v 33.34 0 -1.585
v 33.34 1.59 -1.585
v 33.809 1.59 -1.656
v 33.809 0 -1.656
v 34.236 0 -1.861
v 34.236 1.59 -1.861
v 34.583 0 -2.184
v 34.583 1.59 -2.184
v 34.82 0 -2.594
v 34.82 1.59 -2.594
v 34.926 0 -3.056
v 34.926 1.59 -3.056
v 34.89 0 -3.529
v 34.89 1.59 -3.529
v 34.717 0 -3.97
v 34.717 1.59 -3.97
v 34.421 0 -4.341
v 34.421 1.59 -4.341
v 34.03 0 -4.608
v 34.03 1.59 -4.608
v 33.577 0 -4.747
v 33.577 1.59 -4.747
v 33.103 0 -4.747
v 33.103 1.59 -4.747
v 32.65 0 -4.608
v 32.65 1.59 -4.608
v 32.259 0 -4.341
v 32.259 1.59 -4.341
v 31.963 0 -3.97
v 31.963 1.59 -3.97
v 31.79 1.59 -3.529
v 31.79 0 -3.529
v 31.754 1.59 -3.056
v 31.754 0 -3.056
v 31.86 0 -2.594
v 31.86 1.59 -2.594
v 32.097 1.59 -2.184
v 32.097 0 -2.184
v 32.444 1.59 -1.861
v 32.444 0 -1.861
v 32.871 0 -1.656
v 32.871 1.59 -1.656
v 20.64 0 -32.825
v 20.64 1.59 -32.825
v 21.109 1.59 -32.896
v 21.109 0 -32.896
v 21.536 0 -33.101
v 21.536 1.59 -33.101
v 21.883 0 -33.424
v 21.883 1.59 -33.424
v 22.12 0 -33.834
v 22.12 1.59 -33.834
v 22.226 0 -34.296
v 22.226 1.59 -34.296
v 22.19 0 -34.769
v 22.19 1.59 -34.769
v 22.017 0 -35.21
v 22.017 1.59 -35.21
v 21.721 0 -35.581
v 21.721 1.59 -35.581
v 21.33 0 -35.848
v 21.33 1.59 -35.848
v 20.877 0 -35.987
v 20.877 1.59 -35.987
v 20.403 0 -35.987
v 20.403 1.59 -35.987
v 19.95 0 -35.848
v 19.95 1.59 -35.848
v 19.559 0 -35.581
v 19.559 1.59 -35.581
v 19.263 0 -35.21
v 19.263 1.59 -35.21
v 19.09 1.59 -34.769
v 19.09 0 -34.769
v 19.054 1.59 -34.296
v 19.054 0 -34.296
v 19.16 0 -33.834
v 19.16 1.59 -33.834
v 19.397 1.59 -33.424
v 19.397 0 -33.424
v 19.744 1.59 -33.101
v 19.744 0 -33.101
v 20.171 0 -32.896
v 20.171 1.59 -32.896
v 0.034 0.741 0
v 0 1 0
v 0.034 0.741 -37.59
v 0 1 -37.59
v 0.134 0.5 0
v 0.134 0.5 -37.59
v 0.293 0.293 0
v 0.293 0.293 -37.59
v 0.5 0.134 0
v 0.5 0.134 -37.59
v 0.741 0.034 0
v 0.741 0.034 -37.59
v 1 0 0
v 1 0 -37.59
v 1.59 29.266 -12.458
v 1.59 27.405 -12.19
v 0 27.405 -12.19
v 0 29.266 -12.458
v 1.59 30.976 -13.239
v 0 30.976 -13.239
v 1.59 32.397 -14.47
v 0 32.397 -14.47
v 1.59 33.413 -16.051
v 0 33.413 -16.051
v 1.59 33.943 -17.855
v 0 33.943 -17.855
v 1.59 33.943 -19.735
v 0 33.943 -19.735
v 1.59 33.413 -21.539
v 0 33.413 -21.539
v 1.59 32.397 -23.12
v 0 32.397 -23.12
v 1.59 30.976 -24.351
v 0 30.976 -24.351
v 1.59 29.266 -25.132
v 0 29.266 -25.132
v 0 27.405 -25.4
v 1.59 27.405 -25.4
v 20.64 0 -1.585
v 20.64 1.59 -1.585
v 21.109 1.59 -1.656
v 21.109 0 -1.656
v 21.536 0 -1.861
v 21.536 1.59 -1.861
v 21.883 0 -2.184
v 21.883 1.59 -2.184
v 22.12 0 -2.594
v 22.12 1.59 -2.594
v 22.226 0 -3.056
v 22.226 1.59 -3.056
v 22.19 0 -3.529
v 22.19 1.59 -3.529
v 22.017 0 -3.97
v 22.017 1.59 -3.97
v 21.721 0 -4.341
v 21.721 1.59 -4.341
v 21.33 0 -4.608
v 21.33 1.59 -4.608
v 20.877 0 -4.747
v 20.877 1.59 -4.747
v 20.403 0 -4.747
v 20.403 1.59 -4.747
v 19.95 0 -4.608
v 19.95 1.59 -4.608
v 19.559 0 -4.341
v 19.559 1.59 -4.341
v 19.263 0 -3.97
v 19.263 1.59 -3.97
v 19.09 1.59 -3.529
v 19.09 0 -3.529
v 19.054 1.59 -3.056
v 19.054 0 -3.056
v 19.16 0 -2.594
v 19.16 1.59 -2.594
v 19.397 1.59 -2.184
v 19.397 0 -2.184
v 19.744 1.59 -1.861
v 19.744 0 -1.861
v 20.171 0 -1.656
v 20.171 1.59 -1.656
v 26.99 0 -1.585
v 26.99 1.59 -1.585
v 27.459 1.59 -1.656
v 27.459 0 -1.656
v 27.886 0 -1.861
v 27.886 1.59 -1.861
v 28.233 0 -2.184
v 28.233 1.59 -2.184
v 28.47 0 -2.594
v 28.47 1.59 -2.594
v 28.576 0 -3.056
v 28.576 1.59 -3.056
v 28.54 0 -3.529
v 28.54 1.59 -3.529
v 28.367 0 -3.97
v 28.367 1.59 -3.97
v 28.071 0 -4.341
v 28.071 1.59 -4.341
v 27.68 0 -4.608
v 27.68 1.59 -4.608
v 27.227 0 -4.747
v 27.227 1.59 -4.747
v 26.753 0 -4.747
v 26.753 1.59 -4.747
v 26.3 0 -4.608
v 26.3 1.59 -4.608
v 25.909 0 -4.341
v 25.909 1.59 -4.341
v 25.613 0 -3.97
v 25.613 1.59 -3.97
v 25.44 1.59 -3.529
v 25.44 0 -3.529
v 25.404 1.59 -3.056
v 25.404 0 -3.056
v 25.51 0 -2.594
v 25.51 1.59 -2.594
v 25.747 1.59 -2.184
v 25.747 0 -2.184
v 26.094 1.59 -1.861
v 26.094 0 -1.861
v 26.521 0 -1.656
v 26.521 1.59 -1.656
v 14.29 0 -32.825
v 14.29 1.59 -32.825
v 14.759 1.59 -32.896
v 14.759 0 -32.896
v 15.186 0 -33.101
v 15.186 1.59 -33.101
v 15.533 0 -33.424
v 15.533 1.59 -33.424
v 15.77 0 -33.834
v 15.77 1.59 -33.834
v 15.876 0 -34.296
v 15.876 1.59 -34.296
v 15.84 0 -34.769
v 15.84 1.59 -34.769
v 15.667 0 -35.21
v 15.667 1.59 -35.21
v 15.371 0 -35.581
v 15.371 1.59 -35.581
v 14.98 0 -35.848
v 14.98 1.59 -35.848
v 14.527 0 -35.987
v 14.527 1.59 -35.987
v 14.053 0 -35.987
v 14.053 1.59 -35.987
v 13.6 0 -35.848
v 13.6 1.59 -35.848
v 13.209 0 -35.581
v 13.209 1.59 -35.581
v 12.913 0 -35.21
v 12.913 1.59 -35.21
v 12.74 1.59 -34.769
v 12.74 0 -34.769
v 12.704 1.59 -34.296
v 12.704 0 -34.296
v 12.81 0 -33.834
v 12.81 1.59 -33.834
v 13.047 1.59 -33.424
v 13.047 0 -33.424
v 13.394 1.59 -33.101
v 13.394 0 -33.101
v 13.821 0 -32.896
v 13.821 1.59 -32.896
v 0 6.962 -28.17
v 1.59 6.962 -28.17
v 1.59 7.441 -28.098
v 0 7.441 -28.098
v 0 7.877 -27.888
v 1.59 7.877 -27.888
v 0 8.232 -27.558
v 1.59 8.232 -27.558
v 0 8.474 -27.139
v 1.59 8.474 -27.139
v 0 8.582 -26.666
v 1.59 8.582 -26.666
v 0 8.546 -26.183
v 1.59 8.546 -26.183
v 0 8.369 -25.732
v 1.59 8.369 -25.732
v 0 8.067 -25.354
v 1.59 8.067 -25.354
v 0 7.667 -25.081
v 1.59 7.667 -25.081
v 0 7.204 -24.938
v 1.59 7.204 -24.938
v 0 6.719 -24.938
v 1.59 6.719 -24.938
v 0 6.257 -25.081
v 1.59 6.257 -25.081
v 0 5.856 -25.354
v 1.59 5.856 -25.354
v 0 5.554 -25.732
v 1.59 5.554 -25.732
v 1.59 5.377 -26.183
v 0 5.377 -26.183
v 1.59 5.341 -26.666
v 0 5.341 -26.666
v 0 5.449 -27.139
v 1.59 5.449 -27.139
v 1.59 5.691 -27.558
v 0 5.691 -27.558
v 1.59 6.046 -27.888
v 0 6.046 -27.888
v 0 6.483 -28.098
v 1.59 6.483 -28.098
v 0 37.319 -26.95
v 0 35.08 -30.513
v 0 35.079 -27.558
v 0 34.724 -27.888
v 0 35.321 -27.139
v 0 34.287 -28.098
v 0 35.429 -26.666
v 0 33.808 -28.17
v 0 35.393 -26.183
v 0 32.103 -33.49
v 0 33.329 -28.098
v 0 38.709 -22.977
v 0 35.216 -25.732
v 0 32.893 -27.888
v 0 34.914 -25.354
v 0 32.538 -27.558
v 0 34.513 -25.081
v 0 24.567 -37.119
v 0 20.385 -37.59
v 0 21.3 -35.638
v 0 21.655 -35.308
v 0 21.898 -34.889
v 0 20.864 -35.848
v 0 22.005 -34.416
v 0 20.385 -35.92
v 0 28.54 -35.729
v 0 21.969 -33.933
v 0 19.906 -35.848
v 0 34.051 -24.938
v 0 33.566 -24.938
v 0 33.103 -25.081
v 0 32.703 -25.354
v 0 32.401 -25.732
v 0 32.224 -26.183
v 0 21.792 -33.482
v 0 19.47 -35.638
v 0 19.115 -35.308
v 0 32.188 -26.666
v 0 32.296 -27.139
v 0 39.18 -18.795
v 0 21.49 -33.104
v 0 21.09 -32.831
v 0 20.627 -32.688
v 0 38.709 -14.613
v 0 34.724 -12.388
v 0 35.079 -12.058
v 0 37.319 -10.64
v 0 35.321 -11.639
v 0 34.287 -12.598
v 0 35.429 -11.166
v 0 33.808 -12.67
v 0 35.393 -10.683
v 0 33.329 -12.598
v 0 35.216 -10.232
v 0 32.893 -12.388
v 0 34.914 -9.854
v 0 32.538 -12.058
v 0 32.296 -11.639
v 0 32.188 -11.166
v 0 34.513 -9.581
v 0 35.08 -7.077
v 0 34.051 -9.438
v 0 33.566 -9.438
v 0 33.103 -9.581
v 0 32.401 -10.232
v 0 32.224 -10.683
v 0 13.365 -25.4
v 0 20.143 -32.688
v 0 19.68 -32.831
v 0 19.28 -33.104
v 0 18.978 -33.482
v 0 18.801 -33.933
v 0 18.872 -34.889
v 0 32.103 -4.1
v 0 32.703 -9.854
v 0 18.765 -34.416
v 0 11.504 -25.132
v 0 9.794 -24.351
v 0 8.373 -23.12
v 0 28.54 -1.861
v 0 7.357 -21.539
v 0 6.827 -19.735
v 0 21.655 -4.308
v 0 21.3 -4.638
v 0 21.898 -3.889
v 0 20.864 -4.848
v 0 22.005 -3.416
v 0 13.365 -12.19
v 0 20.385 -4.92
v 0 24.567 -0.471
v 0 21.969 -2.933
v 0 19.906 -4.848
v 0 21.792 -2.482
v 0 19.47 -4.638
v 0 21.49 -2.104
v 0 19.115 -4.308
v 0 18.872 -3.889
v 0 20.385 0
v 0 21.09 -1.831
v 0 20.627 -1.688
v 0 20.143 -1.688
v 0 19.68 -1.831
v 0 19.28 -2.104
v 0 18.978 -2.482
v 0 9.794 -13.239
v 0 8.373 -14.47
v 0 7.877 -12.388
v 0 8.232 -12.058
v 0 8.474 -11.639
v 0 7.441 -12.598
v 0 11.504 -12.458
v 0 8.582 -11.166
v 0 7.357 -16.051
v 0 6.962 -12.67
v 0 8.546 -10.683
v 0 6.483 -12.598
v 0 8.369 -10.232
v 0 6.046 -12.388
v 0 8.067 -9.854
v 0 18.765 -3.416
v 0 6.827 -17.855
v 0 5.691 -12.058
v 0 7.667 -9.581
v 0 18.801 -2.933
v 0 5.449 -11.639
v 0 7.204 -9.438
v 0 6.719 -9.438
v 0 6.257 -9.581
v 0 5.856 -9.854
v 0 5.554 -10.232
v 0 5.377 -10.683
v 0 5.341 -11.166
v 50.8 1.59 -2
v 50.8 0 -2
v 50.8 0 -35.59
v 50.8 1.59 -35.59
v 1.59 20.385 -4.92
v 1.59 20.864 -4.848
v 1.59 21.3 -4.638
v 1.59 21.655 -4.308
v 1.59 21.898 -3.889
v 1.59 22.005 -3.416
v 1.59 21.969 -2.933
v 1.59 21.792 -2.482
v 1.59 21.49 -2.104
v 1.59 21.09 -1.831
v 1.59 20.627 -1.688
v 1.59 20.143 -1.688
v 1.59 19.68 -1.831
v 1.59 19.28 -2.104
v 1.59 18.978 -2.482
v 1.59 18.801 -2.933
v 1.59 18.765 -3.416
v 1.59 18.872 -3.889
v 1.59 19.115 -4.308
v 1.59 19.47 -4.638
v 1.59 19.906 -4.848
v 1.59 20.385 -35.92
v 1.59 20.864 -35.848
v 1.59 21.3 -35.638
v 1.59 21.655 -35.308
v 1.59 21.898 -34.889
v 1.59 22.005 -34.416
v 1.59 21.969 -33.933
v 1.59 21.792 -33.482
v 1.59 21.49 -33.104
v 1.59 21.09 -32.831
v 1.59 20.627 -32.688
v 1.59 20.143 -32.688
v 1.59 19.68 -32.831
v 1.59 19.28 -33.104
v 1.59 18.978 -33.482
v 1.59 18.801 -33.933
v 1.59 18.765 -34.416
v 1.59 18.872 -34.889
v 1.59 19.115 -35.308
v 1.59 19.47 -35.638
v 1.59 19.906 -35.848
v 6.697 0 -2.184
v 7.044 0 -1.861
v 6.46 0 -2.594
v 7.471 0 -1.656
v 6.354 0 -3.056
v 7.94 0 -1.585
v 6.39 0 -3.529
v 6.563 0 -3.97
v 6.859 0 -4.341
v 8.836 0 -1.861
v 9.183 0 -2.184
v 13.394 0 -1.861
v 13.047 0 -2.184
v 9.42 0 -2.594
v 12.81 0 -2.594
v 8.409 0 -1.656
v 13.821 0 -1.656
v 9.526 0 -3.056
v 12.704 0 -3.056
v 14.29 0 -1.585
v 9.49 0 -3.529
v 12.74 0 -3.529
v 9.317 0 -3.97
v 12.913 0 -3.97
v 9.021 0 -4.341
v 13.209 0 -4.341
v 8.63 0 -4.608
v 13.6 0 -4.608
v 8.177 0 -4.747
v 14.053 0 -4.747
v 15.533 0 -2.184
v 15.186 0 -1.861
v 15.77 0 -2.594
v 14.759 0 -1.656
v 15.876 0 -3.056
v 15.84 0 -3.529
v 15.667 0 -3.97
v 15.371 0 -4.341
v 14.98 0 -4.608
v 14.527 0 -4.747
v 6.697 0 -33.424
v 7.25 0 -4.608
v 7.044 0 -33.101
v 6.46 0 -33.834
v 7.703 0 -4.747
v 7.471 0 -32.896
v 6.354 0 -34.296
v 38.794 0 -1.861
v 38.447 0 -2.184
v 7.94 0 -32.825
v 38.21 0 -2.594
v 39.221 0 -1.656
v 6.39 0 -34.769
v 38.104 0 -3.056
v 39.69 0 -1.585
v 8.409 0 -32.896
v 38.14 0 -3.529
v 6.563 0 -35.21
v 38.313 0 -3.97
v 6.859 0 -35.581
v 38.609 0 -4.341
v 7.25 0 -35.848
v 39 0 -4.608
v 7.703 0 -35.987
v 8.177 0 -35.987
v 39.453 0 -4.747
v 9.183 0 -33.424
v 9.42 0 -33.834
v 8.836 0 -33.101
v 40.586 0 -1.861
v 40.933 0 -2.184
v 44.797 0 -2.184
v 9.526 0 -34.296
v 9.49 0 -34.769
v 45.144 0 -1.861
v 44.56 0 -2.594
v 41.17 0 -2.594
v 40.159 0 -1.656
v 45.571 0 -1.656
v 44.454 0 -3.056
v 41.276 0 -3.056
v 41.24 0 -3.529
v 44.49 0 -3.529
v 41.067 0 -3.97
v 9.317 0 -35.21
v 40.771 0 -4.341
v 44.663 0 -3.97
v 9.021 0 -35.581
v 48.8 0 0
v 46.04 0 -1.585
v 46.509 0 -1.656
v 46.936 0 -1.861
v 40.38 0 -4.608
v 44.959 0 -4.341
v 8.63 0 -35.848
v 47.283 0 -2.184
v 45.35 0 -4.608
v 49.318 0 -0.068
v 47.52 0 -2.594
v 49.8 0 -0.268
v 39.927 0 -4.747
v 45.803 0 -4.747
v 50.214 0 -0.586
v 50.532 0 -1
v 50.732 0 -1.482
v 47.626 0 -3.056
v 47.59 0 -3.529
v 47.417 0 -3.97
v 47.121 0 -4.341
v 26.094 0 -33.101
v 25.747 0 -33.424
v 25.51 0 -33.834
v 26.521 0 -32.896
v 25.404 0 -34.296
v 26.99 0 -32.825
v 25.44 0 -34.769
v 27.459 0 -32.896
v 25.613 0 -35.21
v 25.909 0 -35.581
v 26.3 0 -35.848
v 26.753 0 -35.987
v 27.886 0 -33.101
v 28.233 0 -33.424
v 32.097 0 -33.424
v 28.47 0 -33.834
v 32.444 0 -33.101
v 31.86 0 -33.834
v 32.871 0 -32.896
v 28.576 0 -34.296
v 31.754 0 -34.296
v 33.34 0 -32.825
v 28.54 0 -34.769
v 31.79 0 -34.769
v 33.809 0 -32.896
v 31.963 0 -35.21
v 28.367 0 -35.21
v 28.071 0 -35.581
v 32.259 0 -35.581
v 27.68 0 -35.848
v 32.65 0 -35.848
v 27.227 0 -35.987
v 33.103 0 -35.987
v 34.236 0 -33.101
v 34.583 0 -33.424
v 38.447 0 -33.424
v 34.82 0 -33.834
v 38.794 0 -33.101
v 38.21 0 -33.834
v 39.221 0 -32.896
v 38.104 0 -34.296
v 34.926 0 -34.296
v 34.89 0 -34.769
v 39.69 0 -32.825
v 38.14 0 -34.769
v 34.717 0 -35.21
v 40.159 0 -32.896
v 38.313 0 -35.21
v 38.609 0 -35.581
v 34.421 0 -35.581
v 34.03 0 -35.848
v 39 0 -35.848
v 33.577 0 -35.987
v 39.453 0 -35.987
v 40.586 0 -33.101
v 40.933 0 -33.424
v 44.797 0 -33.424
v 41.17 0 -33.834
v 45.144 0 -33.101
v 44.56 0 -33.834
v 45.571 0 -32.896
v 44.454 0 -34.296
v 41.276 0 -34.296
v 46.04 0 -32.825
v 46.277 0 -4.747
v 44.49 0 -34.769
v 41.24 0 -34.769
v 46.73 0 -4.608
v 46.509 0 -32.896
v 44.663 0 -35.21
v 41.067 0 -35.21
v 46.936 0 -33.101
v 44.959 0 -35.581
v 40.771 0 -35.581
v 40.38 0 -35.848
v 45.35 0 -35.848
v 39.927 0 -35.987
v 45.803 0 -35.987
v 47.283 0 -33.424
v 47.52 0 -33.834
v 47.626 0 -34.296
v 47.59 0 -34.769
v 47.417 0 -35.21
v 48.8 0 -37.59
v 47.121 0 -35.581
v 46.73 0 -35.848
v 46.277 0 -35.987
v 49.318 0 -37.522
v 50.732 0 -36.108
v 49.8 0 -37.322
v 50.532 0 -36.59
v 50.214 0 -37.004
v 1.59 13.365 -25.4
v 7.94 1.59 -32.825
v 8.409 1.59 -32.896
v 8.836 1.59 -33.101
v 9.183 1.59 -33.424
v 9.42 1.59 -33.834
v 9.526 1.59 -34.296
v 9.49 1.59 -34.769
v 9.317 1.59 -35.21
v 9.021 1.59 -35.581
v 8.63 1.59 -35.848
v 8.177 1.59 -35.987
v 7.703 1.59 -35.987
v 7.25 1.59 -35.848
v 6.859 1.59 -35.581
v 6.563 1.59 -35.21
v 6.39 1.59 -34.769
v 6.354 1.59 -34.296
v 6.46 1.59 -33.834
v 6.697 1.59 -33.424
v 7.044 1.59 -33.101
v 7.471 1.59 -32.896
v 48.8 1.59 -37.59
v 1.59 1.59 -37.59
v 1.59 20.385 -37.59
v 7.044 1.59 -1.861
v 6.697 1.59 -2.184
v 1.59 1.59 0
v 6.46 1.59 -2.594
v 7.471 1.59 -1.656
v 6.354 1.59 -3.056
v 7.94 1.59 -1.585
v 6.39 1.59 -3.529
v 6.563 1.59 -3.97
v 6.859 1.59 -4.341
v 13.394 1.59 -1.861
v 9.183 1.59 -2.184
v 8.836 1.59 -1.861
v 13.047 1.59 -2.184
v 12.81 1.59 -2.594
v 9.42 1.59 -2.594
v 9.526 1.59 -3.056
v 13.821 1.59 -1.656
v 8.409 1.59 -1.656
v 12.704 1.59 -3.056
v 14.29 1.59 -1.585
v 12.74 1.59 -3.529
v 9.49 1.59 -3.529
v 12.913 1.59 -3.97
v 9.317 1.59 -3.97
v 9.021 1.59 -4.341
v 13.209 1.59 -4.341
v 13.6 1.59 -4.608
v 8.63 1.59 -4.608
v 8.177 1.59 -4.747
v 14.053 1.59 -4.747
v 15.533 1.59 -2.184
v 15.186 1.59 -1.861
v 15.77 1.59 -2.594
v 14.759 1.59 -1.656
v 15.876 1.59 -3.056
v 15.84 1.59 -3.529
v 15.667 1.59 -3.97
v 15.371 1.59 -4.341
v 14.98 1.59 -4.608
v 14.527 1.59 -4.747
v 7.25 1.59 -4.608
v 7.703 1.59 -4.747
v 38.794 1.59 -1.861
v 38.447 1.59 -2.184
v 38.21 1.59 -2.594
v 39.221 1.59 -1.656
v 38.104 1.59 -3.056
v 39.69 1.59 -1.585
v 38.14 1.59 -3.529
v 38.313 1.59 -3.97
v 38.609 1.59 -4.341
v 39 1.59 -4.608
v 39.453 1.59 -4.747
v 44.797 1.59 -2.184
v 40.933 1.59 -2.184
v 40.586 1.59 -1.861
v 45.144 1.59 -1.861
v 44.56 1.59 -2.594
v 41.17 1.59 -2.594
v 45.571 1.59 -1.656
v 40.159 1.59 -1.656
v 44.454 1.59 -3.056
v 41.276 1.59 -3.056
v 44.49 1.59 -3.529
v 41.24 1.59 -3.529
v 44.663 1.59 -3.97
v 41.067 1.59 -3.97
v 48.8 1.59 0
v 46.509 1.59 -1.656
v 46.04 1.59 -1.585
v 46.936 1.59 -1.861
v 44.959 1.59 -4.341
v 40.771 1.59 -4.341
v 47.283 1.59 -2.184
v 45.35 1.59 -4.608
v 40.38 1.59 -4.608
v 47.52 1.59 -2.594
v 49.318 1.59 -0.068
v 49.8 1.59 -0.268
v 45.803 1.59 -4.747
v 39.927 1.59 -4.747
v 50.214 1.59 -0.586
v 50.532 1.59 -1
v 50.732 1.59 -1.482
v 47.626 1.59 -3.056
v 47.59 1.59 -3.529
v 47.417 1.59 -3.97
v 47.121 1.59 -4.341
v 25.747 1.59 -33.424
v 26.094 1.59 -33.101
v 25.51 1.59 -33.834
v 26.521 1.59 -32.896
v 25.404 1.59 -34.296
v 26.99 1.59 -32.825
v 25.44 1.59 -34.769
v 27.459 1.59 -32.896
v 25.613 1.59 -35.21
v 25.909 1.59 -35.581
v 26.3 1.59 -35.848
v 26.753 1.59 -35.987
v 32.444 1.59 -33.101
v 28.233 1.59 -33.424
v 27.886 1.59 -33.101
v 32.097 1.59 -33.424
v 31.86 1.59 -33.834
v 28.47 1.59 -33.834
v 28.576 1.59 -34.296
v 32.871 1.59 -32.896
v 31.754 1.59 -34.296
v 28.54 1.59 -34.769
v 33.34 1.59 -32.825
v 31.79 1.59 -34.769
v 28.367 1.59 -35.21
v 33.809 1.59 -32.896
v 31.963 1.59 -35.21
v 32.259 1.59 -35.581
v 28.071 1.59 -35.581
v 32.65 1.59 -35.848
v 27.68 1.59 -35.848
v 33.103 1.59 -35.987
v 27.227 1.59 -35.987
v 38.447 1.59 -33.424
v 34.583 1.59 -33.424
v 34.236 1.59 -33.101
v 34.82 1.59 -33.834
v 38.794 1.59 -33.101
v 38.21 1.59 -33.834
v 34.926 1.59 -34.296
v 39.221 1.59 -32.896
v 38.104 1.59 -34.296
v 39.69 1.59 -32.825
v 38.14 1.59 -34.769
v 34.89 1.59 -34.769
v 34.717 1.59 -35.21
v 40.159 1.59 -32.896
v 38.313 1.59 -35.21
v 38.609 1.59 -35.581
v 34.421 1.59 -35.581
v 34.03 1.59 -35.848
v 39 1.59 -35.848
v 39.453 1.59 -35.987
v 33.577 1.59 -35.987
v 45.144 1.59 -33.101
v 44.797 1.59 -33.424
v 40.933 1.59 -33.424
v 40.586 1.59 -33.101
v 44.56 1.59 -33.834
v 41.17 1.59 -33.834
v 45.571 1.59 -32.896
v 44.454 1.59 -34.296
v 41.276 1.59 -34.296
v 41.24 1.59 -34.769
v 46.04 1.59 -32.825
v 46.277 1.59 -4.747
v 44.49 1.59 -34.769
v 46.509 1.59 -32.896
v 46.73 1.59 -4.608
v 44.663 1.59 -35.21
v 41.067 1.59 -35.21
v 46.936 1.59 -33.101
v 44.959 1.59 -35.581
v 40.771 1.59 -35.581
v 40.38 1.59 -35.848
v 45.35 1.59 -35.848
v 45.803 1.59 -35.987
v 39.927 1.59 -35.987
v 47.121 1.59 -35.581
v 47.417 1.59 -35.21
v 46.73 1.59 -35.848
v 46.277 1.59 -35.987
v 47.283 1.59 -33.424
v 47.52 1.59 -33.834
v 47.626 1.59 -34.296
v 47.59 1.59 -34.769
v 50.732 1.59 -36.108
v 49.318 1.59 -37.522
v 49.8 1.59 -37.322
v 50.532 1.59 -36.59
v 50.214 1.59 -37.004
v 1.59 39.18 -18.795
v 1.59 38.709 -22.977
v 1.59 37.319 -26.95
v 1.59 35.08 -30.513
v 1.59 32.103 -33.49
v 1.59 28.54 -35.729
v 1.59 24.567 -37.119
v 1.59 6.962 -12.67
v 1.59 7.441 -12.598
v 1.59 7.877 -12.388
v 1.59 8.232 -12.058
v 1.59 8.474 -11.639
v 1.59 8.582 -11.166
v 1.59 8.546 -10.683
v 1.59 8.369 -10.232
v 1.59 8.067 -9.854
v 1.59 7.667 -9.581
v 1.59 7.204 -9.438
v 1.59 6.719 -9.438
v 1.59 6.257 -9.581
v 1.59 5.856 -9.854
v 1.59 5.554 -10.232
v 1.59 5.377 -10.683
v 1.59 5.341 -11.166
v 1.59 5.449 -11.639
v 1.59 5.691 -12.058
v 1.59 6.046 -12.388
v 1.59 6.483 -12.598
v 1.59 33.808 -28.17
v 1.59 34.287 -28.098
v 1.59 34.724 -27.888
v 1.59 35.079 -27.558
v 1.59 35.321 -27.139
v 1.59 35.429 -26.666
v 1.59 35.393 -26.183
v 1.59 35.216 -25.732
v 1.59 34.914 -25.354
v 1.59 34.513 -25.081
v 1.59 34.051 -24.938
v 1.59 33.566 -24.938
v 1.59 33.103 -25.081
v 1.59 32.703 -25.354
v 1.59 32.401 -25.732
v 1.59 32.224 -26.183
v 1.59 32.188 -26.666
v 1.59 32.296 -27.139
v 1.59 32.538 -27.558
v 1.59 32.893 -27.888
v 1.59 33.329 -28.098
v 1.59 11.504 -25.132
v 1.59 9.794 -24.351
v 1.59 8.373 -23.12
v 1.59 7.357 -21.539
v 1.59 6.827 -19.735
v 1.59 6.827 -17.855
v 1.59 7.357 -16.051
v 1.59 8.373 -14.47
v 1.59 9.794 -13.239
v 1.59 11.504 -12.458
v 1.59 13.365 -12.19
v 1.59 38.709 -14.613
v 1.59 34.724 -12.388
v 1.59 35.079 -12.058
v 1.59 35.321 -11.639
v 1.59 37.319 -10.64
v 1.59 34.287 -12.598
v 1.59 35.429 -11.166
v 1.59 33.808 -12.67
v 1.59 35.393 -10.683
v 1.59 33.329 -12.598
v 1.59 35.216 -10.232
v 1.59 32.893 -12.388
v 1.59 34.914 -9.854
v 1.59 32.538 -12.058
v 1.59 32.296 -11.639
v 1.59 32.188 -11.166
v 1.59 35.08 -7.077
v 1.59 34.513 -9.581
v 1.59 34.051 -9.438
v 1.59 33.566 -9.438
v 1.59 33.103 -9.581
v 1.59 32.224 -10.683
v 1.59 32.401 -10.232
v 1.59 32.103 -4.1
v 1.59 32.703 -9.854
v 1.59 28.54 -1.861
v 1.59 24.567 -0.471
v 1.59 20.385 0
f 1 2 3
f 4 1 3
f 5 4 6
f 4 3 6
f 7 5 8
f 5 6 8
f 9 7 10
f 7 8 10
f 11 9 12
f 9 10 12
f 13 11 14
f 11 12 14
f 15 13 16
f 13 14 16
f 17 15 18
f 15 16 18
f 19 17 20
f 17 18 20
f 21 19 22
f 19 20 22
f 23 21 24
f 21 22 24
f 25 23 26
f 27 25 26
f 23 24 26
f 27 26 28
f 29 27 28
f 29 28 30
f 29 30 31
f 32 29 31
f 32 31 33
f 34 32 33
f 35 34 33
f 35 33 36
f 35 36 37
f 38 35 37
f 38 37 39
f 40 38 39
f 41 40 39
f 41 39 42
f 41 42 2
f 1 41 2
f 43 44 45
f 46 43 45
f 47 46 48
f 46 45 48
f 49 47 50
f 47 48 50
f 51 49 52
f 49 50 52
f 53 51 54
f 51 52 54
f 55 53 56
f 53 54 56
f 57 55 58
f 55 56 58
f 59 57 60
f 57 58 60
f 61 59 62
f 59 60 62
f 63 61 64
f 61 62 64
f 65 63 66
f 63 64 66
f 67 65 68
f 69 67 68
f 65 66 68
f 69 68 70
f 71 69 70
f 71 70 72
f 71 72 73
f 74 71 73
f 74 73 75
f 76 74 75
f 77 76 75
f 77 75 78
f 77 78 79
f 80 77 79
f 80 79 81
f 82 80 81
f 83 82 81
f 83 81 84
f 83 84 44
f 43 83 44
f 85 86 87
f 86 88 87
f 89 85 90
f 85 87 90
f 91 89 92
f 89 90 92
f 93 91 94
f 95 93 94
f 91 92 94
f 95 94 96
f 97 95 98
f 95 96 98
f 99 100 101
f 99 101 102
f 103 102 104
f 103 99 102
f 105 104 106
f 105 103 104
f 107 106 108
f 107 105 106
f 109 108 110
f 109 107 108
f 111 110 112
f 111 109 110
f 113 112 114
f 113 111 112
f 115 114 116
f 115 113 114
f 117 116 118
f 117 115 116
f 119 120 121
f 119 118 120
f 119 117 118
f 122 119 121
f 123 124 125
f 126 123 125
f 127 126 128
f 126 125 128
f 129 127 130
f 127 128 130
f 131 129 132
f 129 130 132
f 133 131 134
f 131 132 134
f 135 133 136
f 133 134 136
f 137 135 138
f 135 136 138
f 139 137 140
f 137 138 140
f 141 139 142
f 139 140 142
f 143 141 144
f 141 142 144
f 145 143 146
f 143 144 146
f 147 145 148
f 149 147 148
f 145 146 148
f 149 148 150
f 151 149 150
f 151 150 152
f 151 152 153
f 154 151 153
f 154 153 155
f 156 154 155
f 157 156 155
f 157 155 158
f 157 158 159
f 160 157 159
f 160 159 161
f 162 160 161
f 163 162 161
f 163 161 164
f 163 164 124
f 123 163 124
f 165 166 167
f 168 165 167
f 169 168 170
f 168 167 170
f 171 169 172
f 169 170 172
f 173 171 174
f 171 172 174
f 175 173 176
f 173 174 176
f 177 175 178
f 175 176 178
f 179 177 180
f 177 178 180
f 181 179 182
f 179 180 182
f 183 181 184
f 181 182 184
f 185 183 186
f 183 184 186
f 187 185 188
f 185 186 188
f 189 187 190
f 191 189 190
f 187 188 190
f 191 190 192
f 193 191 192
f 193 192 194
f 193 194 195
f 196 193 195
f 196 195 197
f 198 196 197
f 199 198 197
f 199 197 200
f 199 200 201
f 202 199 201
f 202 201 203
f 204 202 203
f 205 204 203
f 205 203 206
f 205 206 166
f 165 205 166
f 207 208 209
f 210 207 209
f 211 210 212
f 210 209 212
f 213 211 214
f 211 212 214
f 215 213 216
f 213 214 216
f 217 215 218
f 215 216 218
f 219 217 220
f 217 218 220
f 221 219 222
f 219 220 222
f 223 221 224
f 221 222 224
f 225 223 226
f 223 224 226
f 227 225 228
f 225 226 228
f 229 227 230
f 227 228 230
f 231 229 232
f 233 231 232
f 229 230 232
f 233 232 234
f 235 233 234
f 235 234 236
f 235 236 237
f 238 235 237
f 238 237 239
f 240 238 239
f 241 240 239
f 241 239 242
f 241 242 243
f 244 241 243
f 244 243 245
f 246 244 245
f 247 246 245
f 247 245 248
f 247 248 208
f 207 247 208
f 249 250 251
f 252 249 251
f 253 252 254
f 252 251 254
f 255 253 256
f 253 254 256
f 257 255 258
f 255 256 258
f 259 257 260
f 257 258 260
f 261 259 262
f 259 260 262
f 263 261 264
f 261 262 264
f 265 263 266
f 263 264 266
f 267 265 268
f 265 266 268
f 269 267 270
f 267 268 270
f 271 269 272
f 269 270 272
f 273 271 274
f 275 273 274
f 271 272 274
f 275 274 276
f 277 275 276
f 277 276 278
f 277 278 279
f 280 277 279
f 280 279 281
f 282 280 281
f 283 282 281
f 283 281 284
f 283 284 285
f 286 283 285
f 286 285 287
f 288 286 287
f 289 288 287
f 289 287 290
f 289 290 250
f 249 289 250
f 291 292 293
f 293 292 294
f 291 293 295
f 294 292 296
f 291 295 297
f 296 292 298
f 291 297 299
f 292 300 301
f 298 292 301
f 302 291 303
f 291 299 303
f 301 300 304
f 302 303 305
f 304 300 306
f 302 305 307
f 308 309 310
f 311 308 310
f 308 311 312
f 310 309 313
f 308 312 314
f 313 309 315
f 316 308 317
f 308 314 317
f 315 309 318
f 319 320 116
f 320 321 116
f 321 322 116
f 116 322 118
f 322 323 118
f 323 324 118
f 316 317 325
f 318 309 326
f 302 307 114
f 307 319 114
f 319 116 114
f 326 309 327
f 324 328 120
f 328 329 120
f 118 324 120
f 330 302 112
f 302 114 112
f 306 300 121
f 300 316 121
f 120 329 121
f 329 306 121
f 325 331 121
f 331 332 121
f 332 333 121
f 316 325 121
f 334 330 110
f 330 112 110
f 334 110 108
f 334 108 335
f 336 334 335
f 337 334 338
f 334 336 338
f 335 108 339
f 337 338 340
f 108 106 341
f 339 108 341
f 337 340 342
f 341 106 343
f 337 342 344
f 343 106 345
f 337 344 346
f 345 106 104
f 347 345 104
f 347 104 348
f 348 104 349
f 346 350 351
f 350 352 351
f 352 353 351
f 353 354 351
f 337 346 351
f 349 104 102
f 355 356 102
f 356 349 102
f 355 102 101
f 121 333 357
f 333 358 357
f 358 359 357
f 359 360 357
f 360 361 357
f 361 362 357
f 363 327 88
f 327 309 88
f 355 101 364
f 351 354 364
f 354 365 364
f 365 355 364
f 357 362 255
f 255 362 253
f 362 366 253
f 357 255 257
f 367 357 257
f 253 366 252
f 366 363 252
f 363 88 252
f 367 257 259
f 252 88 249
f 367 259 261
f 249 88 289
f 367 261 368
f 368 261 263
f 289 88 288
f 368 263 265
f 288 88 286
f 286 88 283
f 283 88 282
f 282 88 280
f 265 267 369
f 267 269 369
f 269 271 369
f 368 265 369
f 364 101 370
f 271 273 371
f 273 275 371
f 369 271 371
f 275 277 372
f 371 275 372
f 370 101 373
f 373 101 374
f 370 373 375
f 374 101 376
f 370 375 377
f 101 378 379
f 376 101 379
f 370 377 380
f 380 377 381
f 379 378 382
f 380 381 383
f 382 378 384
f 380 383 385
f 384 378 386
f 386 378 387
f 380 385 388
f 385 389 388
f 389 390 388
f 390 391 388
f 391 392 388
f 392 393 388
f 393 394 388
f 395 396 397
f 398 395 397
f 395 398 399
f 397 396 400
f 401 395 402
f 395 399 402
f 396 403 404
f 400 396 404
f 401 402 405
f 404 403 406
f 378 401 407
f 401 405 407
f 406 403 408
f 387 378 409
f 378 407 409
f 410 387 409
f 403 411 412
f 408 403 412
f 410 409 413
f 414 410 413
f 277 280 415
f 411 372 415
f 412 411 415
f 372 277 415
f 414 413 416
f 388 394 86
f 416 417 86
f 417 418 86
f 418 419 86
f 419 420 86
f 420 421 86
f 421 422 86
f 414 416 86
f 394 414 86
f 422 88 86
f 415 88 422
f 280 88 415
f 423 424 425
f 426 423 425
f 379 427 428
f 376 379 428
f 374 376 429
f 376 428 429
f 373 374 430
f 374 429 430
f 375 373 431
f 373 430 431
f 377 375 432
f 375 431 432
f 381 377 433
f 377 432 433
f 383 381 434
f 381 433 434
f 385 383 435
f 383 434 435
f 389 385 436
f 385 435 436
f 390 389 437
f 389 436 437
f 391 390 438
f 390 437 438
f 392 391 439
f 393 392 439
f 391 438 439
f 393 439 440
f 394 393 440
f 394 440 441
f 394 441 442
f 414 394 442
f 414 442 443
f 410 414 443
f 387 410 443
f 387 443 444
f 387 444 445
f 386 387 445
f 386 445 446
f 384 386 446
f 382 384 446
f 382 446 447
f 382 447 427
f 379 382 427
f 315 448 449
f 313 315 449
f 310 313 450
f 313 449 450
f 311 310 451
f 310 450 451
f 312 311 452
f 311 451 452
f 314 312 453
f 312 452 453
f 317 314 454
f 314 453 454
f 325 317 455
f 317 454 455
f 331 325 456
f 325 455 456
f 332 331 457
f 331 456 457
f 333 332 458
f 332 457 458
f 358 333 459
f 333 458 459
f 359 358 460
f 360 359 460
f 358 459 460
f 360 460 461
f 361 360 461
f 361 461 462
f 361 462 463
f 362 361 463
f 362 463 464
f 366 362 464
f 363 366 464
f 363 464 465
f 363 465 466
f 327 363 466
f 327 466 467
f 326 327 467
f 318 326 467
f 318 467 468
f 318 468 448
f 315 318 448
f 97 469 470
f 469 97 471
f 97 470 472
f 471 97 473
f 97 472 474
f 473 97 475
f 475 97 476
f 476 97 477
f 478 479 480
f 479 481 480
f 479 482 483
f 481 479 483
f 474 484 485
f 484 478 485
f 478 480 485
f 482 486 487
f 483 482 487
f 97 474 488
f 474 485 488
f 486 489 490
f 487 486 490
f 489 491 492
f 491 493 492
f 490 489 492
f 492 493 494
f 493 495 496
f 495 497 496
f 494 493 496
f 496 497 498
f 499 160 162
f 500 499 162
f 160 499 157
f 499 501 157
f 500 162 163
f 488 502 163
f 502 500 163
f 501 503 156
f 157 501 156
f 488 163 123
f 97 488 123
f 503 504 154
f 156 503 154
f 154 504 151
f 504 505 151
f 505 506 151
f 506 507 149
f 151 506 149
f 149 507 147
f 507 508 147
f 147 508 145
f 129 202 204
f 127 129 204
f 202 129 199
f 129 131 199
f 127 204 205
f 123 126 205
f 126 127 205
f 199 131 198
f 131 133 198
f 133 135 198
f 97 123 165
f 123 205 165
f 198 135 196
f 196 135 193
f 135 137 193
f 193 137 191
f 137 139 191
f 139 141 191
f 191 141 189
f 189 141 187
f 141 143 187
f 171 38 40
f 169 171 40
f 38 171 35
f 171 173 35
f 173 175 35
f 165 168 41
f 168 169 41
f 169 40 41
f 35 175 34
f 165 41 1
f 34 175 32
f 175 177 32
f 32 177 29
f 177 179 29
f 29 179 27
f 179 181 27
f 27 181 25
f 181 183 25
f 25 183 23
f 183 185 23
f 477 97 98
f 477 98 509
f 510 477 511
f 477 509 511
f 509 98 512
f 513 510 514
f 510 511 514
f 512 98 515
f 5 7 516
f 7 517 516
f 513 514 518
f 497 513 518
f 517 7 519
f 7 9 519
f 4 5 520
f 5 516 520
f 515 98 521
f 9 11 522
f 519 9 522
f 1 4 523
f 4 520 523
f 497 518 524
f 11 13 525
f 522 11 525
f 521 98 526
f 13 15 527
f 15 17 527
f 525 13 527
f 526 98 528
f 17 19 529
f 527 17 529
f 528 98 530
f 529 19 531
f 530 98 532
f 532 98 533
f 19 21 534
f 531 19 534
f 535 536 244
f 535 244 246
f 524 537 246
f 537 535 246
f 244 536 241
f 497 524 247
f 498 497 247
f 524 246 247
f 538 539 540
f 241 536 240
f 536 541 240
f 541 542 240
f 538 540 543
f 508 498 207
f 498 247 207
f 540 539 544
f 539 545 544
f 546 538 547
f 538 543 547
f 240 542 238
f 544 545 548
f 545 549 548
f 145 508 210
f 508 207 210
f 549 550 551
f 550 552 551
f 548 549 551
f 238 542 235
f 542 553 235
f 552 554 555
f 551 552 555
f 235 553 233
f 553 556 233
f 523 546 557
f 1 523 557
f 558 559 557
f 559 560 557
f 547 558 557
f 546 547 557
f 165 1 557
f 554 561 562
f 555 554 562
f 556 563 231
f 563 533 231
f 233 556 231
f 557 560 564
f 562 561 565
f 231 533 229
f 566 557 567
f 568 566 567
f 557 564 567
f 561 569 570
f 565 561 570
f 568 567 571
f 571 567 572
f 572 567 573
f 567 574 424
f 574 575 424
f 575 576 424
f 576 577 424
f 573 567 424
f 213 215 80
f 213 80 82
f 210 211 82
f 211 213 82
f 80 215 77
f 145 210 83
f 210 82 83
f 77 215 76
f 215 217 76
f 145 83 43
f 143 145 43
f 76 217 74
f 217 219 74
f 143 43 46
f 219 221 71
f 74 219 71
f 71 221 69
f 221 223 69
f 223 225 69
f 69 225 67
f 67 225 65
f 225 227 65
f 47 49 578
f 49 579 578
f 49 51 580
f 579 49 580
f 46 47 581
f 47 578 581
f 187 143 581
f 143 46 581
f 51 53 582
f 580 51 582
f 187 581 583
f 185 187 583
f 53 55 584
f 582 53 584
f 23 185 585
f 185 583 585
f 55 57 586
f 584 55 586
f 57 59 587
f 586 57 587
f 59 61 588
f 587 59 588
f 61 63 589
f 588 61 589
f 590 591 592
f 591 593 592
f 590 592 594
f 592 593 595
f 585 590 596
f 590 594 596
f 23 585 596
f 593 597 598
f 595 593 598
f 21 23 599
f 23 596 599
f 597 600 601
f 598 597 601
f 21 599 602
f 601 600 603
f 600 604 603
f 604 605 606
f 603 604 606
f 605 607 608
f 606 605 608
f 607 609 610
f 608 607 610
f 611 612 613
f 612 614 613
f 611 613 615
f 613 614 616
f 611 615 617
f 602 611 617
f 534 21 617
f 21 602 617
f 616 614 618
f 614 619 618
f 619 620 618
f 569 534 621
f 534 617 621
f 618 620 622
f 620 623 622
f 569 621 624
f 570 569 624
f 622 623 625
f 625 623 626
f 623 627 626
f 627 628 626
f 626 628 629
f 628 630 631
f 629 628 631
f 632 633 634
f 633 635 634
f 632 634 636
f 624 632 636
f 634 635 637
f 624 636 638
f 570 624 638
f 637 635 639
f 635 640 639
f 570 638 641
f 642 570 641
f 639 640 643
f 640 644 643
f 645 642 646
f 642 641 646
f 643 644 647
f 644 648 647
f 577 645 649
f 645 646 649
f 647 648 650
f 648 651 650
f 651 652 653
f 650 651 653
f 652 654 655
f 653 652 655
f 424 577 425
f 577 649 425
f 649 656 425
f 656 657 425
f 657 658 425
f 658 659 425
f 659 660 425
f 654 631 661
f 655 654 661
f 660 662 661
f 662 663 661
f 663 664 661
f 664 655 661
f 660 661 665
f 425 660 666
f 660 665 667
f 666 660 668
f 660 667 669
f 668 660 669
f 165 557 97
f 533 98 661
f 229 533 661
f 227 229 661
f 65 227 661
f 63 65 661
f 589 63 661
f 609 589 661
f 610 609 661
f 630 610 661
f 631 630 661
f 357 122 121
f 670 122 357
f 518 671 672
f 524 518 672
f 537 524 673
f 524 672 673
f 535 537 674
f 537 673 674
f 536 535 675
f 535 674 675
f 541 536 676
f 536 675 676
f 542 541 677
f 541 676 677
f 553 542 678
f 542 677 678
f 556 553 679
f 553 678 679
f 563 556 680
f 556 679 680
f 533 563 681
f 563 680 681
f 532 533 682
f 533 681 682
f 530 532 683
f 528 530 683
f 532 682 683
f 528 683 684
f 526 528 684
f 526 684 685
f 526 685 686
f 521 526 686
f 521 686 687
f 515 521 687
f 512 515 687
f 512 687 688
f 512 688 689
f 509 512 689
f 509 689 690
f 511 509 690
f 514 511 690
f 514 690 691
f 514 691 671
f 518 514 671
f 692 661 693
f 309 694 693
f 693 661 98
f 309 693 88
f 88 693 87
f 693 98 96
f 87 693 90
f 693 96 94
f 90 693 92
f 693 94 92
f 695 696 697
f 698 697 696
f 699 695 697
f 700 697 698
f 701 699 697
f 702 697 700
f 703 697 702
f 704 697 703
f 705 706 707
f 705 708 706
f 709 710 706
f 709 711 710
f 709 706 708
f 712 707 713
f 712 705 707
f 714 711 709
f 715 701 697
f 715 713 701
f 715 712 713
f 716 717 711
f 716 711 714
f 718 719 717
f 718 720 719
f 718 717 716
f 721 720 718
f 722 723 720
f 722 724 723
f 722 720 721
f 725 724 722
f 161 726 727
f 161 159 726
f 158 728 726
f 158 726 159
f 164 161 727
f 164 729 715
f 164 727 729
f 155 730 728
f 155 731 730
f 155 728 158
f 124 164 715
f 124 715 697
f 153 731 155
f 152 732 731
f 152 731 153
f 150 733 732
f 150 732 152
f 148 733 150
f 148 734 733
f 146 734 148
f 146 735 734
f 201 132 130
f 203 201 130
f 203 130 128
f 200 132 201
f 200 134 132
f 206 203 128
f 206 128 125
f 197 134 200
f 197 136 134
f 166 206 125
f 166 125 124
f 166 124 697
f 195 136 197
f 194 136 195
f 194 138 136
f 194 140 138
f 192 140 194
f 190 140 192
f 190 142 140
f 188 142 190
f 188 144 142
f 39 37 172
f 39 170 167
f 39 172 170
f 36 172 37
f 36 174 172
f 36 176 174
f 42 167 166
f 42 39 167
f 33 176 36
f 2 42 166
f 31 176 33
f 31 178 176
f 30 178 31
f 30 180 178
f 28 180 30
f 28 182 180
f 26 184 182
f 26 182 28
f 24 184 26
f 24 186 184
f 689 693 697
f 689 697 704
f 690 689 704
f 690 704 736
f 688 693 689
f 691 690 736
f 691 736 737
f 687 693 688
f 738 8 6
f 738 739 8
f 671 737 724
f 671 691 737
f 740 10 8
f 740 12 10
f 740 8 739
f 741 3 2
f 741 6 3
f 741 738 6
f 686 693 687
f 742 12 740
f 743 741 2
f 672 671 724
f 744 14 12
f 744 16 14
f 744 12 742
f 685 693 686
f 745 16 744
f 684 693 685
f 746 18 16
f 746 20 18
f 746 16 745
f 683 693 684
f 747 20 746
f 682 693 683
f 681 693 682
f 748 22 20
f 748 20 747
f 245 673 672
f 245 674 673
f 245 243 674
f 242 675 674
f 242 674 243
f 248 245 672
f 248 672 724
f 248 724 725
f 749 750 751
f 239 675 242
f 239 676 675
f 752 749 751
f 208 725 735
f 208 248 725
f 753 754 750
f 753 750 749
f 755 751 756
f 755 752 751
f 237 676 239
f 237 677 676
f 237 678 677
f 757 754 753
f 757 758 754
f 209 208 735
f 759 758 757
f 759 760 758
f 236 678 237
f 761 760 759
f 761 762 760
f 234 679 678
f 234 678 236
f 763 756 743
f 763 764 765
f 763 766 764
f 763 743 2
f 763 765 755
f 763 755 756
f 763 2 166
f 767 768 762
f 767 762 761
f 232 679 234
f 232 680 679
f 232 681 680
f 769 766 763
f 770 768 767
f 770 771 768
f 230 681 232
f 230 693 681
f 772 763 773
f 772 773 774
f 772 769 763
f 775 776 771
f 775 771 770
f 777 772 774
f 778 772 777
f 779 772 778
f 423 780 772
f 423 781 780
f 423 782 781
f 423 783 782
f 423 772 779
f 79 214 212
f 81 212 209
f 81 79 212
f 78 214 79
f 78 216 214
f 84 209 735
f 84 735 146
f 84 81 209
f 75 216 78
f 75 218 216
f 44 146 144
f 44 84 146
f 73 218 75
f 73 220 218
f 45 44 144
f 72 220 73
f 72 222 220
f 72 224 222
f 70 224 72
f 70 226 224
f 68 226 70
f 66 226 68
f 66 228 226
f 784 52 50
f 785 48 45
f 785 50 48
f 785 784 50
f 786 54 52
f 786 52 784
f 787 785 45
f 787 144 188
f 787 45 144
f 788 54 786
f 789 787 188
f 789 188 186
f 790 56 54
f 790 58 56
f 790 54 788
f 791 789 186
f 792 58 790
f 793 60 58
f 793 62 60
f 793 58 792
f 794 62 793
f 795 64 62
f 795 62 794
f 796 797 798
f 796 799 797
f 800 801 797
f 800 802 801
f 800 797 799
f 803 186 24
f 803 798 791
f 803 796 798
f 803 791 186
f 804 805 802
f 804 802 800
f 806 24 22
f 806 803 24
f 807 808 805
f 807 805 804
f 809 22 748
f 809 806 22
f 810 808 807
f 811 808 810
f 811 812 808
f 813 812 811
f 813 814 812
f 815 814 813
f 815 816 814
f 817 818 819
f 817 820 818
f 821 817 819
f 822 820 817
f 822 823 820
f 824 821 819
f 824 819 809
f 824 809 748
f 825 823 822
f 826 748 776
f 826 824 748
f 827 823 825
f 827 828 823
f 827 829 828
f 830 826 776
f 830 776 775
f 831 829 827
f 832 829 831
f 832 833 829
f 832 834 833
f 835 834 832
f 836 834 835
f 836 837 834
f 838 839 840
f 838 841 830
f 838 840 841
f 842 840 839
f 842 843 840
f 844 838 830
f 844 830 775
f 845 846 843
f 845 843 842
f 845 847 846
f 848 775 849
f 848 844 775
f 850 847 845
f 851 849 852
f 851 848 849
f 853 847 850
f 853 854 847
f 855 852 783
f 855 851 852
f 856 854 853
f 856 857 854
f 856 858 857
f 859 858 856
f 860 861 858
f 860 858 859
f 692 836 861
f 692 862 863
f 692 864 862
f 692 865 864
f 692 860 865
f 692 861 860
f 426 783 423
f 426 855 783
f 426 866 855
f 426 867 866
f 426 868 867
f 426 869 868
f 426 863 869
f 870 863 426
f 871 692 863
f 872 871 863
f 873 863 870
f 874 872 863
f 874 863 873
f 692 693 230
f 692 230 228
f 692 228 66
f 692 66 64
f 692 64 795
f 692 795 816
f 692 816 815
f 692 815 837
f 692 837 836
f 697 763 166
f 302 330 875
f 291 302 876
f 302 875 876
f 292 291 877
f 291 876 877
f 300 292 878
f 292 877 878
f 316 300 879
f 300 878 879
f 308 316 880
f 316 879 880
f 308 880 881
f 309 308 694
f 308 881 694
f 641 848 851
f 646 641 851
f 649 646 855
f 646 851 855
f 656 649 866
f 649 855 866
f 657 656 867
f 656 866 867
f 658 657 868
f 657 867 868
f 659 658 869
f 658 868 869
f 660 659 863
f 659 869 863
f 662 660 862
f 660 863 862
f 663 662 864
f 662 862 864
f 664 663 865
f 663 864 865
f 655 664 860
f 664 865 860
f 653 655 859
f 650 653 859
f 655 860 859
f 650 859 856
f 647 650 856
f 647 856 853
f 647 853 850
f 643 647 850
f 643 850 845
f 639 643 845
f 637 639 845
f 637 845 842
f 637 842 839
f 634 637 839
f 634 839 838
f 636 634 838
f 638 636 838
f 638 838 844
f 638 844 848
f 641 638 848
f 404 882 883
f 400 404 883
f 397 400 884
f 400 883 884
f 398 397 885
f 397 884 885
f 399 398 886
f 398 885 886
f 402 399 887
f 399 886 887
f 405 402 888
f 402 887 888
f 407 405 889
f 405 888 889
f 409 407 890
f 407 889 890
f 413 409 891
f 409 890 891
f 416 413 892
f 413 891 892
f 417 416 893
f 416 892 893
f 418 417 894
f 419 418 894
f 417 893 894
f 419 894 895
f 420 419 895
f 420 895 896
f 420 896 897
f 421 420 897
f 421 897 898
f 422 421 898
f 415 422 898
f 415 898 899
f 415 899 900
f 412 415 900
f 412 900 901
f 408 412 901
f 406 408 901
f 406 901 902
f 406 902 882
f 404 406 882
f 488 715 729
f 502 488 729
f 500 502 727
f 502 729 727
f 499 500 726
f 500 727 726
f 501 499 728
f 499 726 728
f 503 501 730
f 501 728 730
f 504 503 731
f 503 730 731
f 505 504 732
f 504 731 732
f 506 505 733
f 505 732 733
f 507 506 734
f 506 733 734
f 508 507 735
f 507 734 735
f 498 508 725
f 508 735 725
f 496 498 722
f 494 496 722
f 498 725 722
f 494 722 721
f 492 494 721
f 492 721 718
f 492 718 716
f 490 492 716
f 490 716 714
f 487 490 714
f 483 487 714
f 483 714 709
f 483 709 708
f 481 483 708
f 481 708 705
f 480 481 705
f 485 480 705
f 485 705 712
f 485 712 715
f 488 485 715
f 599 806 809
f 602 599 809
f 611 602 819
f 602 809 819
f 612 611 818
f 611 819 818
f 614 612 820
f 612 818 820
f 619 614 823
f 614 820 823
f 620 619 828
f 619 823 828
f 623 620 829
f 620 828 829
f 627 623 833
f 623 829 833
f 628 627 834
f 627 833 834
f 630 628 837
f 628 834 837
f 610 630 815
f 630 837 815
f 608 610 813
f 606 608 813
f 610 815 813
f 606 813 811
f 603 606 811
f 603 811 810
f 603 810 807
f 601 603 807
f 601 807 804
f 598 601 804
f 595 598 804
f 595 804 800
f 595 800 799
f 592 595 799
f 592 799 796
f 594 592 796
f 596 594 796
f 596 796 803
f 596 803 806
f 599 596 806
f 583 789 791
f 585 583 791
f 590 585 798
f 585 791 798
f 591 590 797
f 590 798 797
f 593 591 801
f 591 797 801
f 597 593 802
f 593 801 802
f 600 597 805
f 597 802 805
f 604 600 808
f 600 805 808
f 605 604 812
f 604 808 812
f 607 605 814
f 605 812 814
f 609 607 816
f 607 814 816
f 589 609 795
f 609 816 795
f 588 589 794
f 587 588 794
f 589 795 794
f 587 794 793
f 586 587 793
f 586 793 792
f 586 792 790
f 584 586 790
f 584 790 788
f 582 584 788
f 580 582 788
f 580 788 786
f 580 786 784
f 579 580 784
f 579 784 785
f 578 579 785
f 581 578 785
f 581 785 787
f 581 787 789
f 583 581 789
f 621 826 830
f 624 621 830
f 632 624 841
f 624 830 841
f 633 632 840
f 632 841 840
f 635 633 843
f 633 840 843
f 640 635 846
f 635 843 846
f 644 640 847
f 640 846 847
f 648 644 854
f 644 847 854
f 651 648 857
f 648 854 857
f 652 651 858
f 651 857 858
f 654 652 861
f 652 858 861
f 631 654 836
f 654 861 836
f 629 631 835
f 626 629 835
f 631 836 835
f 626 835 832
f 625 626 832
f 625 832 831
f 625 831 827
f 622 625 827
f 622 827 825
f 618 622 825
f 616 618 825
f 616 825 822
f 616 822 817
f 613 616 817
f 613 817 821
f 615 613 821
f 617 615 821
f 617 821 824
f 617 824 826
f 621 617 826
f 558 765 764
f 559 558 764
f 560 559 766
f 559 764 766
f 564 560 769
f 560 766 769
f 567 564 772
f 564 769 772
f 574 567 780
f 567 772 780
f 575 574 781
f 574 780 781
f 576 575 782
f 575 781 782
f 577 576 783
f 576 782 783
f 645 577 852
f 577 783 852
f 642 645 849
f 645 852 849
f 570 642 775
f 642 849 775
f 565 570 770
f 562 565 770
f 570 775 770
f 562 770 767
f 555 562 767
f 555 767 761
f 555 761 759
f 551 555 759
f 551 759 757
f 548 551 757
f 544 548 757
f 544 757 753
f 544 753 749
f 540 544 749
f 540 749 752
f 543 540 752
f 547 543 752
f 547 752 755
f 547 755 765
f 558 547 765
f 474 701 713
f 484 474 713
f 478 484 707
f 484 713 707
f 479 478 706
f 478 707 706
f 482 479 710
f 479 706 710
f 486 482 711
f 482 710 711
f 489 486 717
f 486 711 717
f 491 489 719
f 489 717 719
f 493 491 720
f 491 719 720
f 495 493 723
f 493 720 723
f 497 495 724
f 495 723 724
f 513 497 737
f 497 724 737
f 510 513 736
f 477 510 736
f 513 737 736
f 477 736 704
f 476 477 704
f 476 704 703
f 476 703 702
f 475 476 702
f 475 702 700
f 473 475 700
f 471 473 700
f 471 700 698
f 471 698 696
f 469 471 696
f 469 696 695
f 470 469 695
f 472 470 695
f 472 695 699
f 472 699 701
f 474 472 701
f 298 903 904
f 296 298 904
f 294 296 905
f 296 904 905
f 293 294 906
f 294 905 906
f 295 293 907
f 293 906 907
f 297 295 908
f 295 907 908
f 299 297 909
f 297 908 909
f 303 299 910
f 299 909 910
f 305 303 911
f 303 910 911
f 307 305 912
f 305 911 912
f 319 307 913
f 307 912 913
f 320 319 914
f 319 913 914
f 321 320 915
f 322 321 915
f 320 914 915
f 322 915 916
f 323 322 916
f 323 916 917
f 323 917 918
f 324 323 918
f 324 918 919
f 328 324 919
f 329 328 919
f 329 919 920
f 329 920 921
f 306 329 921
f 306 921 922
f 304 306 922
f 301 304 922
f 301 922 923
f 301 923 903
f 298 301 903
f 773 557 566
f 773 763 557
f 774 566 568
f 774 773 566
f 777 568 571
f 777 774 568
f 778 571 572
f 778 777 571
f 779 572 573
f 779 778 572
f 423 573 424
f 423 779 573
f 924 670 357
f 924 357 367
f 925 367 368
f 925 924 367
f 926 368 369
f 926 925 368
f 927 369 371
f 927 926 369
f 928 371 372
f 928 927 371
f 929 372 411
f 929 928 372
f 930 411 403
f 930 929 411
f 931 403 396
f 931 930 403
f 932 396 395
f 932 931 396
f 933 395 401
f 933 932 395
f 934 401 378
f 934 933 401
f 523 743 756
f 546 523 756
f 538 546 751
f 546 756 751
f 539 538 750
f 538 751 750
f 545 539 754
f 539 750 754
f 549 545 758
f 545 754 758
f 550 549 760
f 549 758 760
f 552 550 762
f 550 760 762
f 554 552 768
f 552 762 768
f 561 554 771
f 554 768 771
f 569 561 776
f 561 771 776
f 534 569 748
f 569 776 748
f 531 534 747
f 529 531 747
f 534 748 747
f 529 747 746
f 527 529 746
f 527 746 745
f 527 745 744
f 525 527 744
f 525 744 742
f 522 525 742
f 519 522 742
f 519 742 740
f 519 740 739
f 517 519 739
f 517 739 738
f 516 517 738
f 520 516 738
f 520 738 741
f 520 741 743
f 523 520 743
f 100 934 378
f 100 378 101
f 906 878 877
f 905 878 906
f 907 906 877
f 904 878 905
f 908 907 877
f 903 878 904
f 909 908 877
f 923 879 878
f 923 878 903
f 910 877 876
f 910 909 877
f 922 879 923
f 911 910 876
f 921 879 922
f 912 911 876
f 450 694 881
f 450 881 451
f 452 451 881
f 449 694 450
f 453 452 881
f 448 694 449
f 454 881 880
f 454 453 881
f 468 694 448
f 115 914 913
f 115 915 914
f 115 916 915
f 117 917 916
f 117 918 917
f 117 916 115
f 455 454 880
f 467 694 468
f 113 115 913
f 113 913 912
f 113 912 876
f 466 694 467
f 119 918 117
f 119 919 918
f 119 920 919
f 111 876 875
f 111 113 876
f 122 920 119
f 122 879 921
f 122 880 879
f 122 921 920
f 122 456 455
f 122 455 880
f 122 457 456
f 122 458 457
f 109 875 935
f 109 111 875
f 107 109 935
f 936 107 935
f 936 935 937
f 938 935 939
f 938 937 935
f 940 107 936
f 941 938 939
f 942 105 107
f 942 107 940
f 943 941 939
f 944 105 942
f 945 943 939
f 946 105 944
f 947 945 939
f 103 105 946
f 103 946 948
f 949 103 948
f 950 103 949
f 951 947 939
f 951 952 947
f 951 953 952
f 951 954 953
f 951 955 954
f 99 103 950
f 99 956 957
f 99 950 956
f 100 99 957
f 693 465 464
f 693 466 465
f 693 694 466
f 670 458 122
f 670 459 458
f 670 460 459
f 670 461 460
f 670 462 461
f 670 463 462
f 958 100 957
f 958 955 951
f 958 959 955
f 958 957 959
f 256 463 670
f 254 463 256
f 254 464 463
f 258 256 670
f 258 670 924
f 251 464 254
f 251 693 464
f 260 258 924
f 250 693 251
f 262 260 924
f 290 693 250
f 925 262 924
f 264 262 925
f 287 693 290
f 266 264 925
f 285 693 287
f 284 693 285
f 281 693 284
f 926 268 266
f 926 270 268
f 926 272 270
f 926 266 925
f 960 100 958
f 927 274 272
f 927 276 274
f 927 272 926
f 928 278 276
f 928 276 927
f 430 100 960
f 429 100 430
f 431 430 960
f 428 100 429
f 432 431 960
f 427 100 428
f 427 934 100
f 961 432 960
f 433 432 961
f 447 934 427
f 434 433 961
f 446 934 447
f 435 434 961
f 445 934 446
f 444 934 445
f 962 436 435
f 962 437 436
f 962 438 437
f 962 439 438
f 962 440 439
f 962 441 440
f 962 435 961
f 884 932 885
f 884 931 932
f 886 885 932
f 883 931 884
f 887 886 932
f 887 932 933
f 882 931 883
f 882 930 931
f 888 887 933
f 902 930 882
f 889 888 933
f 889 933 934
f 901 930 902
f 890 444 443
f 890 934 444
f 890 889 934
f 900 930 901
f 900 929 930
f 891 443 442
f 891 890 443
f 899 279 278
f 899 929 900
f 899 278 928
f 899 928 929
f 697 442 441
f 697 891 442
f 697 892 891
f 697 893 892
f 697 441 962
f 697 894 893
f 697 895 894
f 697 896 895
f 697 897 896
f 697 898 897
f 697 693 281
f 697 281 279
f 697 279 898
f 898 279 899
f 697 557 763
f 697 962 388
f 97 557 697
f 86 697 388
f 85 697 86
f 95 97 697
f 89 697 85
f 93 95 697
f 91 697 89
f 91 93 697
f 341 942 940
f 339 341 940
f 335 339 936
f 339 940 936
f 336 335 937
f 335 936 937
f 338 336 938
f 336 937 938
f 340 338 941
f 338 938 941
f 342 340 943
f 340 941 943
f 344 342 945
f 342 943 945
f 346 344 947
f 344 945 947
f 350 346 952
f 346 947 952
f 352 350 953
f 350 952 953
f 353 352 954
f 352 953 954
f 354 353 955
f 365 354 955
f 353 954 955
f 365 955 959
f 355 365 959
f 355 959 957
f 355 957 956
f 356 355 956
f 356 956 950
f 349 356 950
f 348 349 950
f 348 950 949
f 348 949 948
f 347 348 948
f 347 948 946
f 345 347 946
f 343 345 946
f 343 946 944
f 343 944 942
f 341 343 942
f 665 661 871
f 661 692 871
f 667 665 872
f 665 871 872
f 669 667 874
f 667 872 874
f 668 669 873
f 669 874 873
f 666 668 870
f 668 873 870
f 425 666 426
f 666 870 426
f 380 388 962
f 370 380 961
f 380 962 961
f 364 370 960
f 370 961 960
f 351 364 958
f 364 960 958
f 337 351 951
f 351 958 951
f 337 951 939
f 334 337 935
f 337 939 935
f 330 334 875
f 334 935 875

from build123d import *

# Parameters (mm, degrees)
ESQUISSE1_W             = 50.8
ESQUISSE1_H             = 37.59
BOSS_EXTRU_1_DEPTH      = 1.59
ESQUISSE2_W             = 1.59
ESQUISSE2_H             = 37.59
BOSS_EXTRU_2_DEPTH      = 37.59
CONG_1_R                = 1
ESQUISSE3_R             = 1.59
ENL_V_MAT_EXTRU_1_DEPTH = 74.52996804
CONG_2_R                = 2
ENL_V_MAT_EXTRU_2_DEPTH = 74.278268266
ESQUISSE5_R             = 1.625
ENL_V_MAT_EXTRU_3_DEPTH = 74.278268266


with BuildPart() as part:
    # Esquisse1 → Boss.-Extru.1 (new body)
    with BuildSketch(Plane(origin=(0, 0, 0), x_dir=(1, 0, 0), z_dir=(0, 1, 0))):
        with Locations((25.4, 18.795)):
            Rectangle(ESQUISSE1_W, ESQUISSE1_H)
    extrude(amount=BOSS_EXTRU_1_DEPTH)

    # Esquisse2 → Boss.-Extru.2 (add)
    with BuildSketch(Plane(origin=(0, 1.59, 0), x_dir=(-1, 0, 0), z_dir=(0, 1, 0))):
        with Locations((-0.795, -18.795)):
            Rectangle(ESQUISSE2_W, ESQUISSE2_H)
    extrude(amount=BOSS_EXTRU_2_DEPTH)

    # Congé1
    cong_1_edges = [part.edges().sort_by_distance(p)[0] for p in [
        (0, 0, -18.795),
    ]]
    fillet(cong_1_edges, radius=CONG_1_R)

    # Esquisse3 → Enlèv. mat.-Extru.1 (cut, through all)
    with BuildSketch(Plane(origin=(0, 1.59, 0), x_dir=(1, 0, 0), z_dir=(0, 1, 0))):
        with Locations(Location((7.94, 34.415, 0), (0, 0, 270))):
            Circle(ESQUISSE3_R)
        with Locations(Location((14.29, 34.415, 0), (0, 0, 270))):
            Circle(ESQUISSE3_R)
        with Locations(Location((20.64, 34.415, 0), (0, 0, 270))):
            Circle(ESQUISSE3_R)
        with Locations(Location((26.99, 34.415, 0), (0, 0, 270))):
            Circle(ESQUISSE3_R)
        with Locations(Location((33.34, 34.415, 0), (0, 0, 270))):
            Circle(ESQUISSE3_R)
        with Locations(Location((39.69, 34.415, 0), (0, 0, 270))):
            Circle(ESQUISSE3_R)
        with Locations(Location((46.04, 34.415, 0), (0, 0, 270))):
            Circle(ESQUISSE3_R)
        with Locations(Location((46.04, 3.175, 0), (0, 0, 270))):
            Circle(ESQUISSE3_R)
        with Locations(Location((39.69, 3.175, 0), (0, 0, 270))):
            Circle(ESQUISSE3_R)
        with Locations(Location((33.34, 3.175, 0), (0, 0, 270))):
            Circle(ESQUISSE3_R)
        with Locations(Location((26.99, 3.175, 0), (0, 0, 270))):
            Circle(ESQUISSE3_R)
        with Locations(Location((20.64, 3.175, 0), (0, 0, 270))):
            Circle(ESQUISSE3_R)
        with Locations(Location((14.29, 3.175, 0), (0, 0, 270))):
            Circle(ESQUISSE3_R)
        with Locations(Location((7.94, 3.175, 0), (0, 0, 270))):
            Circle(ESQUISSE3_R)
    extrude(amount=-ENL_V_MAT_EXTRU_1_DEPTH, mode=Mode.SUBTRACT)

    # Congé2
    cong_2_edges = [part.edges().sort_by_distance(p)[0] for p in [
        (50.8, 0.795, 0),
        (50.8, 0.795, -37.59),
    ]]
    fillet(cong_2_edges, radius=CONG_2_R)

    # Esquisse4 → Enlèv. mat.-Extru.2 (cut, through all)
    with BuildSketch(Plane(origin=(1.59, 0, 0), x_dir=(0, 0, -1), z_dir=(1, 0, 0))):
        with BuildLine():
            Line((0, 39.18), (0, 20.385))
            ThreePointArc((0, 20.385), (5.504928048, 33.675071952), (18.795, 39.18))
            Line((18.795, 39.18), (0, 39.18))
        make_face()
        with BuildLine():
            Line((37.59, 39.18), (18.795, 39.18))
            ThreePointArc((18.795, 39.18), (32.085071952, 33.675071952), (37.59, 20.385))
            Line((37.59, 20.385), (37.59, 39.18))
        make_face()
    extrude(amount=-ENL_V_MAT_EXTRU_2_DEPTH, mode=Mode.SUBTRACT)

    # Esquisse5 → Enlèv. mat.-Extru.3 (cut, through all)
    with BuildSketch(Plane(origin=(1.59, 0, 0), x_dir=(0, 0, -1), z_dir=(1, 0, 0))):
        with Locations((34.295, 20.385)):
            Circle(ESQUISSE5_R)
        with Locations((26.545, 6.961606241)):
            Circle(ESQUISSE5_R)
        with Locations((11.045, 6.961606241)):
            Circle(ESQUISSE5_R)
        with Locations((3.295, 20.385)):
            Circle(ESQUISSE5_R)
        with Locations((11.045, 33.808393759)):
            Circle(ESQUISSE5_R)
        with Locations((26.545, 33.808393759)):
            Circle(ESQUISSE5_R)
        with BuildLine():
            Line((12.19, 13.365), (12.19, 27.405))
            ThreePointArc((12.19, 27.405), (18.795, 34.01), (25.4, 27.405))
            Line((25.4, 27.405), (25.4, 13.365))
            ThreePointArc((25.4, 13.365), (18.795, 6.76), (12.19, 13.365))
        make_face()
    extrude(amount=-ENL_V_MAT_EXTRU_3_DEPTH, mode=Mode.SUBTRACT)


solid = part.part
